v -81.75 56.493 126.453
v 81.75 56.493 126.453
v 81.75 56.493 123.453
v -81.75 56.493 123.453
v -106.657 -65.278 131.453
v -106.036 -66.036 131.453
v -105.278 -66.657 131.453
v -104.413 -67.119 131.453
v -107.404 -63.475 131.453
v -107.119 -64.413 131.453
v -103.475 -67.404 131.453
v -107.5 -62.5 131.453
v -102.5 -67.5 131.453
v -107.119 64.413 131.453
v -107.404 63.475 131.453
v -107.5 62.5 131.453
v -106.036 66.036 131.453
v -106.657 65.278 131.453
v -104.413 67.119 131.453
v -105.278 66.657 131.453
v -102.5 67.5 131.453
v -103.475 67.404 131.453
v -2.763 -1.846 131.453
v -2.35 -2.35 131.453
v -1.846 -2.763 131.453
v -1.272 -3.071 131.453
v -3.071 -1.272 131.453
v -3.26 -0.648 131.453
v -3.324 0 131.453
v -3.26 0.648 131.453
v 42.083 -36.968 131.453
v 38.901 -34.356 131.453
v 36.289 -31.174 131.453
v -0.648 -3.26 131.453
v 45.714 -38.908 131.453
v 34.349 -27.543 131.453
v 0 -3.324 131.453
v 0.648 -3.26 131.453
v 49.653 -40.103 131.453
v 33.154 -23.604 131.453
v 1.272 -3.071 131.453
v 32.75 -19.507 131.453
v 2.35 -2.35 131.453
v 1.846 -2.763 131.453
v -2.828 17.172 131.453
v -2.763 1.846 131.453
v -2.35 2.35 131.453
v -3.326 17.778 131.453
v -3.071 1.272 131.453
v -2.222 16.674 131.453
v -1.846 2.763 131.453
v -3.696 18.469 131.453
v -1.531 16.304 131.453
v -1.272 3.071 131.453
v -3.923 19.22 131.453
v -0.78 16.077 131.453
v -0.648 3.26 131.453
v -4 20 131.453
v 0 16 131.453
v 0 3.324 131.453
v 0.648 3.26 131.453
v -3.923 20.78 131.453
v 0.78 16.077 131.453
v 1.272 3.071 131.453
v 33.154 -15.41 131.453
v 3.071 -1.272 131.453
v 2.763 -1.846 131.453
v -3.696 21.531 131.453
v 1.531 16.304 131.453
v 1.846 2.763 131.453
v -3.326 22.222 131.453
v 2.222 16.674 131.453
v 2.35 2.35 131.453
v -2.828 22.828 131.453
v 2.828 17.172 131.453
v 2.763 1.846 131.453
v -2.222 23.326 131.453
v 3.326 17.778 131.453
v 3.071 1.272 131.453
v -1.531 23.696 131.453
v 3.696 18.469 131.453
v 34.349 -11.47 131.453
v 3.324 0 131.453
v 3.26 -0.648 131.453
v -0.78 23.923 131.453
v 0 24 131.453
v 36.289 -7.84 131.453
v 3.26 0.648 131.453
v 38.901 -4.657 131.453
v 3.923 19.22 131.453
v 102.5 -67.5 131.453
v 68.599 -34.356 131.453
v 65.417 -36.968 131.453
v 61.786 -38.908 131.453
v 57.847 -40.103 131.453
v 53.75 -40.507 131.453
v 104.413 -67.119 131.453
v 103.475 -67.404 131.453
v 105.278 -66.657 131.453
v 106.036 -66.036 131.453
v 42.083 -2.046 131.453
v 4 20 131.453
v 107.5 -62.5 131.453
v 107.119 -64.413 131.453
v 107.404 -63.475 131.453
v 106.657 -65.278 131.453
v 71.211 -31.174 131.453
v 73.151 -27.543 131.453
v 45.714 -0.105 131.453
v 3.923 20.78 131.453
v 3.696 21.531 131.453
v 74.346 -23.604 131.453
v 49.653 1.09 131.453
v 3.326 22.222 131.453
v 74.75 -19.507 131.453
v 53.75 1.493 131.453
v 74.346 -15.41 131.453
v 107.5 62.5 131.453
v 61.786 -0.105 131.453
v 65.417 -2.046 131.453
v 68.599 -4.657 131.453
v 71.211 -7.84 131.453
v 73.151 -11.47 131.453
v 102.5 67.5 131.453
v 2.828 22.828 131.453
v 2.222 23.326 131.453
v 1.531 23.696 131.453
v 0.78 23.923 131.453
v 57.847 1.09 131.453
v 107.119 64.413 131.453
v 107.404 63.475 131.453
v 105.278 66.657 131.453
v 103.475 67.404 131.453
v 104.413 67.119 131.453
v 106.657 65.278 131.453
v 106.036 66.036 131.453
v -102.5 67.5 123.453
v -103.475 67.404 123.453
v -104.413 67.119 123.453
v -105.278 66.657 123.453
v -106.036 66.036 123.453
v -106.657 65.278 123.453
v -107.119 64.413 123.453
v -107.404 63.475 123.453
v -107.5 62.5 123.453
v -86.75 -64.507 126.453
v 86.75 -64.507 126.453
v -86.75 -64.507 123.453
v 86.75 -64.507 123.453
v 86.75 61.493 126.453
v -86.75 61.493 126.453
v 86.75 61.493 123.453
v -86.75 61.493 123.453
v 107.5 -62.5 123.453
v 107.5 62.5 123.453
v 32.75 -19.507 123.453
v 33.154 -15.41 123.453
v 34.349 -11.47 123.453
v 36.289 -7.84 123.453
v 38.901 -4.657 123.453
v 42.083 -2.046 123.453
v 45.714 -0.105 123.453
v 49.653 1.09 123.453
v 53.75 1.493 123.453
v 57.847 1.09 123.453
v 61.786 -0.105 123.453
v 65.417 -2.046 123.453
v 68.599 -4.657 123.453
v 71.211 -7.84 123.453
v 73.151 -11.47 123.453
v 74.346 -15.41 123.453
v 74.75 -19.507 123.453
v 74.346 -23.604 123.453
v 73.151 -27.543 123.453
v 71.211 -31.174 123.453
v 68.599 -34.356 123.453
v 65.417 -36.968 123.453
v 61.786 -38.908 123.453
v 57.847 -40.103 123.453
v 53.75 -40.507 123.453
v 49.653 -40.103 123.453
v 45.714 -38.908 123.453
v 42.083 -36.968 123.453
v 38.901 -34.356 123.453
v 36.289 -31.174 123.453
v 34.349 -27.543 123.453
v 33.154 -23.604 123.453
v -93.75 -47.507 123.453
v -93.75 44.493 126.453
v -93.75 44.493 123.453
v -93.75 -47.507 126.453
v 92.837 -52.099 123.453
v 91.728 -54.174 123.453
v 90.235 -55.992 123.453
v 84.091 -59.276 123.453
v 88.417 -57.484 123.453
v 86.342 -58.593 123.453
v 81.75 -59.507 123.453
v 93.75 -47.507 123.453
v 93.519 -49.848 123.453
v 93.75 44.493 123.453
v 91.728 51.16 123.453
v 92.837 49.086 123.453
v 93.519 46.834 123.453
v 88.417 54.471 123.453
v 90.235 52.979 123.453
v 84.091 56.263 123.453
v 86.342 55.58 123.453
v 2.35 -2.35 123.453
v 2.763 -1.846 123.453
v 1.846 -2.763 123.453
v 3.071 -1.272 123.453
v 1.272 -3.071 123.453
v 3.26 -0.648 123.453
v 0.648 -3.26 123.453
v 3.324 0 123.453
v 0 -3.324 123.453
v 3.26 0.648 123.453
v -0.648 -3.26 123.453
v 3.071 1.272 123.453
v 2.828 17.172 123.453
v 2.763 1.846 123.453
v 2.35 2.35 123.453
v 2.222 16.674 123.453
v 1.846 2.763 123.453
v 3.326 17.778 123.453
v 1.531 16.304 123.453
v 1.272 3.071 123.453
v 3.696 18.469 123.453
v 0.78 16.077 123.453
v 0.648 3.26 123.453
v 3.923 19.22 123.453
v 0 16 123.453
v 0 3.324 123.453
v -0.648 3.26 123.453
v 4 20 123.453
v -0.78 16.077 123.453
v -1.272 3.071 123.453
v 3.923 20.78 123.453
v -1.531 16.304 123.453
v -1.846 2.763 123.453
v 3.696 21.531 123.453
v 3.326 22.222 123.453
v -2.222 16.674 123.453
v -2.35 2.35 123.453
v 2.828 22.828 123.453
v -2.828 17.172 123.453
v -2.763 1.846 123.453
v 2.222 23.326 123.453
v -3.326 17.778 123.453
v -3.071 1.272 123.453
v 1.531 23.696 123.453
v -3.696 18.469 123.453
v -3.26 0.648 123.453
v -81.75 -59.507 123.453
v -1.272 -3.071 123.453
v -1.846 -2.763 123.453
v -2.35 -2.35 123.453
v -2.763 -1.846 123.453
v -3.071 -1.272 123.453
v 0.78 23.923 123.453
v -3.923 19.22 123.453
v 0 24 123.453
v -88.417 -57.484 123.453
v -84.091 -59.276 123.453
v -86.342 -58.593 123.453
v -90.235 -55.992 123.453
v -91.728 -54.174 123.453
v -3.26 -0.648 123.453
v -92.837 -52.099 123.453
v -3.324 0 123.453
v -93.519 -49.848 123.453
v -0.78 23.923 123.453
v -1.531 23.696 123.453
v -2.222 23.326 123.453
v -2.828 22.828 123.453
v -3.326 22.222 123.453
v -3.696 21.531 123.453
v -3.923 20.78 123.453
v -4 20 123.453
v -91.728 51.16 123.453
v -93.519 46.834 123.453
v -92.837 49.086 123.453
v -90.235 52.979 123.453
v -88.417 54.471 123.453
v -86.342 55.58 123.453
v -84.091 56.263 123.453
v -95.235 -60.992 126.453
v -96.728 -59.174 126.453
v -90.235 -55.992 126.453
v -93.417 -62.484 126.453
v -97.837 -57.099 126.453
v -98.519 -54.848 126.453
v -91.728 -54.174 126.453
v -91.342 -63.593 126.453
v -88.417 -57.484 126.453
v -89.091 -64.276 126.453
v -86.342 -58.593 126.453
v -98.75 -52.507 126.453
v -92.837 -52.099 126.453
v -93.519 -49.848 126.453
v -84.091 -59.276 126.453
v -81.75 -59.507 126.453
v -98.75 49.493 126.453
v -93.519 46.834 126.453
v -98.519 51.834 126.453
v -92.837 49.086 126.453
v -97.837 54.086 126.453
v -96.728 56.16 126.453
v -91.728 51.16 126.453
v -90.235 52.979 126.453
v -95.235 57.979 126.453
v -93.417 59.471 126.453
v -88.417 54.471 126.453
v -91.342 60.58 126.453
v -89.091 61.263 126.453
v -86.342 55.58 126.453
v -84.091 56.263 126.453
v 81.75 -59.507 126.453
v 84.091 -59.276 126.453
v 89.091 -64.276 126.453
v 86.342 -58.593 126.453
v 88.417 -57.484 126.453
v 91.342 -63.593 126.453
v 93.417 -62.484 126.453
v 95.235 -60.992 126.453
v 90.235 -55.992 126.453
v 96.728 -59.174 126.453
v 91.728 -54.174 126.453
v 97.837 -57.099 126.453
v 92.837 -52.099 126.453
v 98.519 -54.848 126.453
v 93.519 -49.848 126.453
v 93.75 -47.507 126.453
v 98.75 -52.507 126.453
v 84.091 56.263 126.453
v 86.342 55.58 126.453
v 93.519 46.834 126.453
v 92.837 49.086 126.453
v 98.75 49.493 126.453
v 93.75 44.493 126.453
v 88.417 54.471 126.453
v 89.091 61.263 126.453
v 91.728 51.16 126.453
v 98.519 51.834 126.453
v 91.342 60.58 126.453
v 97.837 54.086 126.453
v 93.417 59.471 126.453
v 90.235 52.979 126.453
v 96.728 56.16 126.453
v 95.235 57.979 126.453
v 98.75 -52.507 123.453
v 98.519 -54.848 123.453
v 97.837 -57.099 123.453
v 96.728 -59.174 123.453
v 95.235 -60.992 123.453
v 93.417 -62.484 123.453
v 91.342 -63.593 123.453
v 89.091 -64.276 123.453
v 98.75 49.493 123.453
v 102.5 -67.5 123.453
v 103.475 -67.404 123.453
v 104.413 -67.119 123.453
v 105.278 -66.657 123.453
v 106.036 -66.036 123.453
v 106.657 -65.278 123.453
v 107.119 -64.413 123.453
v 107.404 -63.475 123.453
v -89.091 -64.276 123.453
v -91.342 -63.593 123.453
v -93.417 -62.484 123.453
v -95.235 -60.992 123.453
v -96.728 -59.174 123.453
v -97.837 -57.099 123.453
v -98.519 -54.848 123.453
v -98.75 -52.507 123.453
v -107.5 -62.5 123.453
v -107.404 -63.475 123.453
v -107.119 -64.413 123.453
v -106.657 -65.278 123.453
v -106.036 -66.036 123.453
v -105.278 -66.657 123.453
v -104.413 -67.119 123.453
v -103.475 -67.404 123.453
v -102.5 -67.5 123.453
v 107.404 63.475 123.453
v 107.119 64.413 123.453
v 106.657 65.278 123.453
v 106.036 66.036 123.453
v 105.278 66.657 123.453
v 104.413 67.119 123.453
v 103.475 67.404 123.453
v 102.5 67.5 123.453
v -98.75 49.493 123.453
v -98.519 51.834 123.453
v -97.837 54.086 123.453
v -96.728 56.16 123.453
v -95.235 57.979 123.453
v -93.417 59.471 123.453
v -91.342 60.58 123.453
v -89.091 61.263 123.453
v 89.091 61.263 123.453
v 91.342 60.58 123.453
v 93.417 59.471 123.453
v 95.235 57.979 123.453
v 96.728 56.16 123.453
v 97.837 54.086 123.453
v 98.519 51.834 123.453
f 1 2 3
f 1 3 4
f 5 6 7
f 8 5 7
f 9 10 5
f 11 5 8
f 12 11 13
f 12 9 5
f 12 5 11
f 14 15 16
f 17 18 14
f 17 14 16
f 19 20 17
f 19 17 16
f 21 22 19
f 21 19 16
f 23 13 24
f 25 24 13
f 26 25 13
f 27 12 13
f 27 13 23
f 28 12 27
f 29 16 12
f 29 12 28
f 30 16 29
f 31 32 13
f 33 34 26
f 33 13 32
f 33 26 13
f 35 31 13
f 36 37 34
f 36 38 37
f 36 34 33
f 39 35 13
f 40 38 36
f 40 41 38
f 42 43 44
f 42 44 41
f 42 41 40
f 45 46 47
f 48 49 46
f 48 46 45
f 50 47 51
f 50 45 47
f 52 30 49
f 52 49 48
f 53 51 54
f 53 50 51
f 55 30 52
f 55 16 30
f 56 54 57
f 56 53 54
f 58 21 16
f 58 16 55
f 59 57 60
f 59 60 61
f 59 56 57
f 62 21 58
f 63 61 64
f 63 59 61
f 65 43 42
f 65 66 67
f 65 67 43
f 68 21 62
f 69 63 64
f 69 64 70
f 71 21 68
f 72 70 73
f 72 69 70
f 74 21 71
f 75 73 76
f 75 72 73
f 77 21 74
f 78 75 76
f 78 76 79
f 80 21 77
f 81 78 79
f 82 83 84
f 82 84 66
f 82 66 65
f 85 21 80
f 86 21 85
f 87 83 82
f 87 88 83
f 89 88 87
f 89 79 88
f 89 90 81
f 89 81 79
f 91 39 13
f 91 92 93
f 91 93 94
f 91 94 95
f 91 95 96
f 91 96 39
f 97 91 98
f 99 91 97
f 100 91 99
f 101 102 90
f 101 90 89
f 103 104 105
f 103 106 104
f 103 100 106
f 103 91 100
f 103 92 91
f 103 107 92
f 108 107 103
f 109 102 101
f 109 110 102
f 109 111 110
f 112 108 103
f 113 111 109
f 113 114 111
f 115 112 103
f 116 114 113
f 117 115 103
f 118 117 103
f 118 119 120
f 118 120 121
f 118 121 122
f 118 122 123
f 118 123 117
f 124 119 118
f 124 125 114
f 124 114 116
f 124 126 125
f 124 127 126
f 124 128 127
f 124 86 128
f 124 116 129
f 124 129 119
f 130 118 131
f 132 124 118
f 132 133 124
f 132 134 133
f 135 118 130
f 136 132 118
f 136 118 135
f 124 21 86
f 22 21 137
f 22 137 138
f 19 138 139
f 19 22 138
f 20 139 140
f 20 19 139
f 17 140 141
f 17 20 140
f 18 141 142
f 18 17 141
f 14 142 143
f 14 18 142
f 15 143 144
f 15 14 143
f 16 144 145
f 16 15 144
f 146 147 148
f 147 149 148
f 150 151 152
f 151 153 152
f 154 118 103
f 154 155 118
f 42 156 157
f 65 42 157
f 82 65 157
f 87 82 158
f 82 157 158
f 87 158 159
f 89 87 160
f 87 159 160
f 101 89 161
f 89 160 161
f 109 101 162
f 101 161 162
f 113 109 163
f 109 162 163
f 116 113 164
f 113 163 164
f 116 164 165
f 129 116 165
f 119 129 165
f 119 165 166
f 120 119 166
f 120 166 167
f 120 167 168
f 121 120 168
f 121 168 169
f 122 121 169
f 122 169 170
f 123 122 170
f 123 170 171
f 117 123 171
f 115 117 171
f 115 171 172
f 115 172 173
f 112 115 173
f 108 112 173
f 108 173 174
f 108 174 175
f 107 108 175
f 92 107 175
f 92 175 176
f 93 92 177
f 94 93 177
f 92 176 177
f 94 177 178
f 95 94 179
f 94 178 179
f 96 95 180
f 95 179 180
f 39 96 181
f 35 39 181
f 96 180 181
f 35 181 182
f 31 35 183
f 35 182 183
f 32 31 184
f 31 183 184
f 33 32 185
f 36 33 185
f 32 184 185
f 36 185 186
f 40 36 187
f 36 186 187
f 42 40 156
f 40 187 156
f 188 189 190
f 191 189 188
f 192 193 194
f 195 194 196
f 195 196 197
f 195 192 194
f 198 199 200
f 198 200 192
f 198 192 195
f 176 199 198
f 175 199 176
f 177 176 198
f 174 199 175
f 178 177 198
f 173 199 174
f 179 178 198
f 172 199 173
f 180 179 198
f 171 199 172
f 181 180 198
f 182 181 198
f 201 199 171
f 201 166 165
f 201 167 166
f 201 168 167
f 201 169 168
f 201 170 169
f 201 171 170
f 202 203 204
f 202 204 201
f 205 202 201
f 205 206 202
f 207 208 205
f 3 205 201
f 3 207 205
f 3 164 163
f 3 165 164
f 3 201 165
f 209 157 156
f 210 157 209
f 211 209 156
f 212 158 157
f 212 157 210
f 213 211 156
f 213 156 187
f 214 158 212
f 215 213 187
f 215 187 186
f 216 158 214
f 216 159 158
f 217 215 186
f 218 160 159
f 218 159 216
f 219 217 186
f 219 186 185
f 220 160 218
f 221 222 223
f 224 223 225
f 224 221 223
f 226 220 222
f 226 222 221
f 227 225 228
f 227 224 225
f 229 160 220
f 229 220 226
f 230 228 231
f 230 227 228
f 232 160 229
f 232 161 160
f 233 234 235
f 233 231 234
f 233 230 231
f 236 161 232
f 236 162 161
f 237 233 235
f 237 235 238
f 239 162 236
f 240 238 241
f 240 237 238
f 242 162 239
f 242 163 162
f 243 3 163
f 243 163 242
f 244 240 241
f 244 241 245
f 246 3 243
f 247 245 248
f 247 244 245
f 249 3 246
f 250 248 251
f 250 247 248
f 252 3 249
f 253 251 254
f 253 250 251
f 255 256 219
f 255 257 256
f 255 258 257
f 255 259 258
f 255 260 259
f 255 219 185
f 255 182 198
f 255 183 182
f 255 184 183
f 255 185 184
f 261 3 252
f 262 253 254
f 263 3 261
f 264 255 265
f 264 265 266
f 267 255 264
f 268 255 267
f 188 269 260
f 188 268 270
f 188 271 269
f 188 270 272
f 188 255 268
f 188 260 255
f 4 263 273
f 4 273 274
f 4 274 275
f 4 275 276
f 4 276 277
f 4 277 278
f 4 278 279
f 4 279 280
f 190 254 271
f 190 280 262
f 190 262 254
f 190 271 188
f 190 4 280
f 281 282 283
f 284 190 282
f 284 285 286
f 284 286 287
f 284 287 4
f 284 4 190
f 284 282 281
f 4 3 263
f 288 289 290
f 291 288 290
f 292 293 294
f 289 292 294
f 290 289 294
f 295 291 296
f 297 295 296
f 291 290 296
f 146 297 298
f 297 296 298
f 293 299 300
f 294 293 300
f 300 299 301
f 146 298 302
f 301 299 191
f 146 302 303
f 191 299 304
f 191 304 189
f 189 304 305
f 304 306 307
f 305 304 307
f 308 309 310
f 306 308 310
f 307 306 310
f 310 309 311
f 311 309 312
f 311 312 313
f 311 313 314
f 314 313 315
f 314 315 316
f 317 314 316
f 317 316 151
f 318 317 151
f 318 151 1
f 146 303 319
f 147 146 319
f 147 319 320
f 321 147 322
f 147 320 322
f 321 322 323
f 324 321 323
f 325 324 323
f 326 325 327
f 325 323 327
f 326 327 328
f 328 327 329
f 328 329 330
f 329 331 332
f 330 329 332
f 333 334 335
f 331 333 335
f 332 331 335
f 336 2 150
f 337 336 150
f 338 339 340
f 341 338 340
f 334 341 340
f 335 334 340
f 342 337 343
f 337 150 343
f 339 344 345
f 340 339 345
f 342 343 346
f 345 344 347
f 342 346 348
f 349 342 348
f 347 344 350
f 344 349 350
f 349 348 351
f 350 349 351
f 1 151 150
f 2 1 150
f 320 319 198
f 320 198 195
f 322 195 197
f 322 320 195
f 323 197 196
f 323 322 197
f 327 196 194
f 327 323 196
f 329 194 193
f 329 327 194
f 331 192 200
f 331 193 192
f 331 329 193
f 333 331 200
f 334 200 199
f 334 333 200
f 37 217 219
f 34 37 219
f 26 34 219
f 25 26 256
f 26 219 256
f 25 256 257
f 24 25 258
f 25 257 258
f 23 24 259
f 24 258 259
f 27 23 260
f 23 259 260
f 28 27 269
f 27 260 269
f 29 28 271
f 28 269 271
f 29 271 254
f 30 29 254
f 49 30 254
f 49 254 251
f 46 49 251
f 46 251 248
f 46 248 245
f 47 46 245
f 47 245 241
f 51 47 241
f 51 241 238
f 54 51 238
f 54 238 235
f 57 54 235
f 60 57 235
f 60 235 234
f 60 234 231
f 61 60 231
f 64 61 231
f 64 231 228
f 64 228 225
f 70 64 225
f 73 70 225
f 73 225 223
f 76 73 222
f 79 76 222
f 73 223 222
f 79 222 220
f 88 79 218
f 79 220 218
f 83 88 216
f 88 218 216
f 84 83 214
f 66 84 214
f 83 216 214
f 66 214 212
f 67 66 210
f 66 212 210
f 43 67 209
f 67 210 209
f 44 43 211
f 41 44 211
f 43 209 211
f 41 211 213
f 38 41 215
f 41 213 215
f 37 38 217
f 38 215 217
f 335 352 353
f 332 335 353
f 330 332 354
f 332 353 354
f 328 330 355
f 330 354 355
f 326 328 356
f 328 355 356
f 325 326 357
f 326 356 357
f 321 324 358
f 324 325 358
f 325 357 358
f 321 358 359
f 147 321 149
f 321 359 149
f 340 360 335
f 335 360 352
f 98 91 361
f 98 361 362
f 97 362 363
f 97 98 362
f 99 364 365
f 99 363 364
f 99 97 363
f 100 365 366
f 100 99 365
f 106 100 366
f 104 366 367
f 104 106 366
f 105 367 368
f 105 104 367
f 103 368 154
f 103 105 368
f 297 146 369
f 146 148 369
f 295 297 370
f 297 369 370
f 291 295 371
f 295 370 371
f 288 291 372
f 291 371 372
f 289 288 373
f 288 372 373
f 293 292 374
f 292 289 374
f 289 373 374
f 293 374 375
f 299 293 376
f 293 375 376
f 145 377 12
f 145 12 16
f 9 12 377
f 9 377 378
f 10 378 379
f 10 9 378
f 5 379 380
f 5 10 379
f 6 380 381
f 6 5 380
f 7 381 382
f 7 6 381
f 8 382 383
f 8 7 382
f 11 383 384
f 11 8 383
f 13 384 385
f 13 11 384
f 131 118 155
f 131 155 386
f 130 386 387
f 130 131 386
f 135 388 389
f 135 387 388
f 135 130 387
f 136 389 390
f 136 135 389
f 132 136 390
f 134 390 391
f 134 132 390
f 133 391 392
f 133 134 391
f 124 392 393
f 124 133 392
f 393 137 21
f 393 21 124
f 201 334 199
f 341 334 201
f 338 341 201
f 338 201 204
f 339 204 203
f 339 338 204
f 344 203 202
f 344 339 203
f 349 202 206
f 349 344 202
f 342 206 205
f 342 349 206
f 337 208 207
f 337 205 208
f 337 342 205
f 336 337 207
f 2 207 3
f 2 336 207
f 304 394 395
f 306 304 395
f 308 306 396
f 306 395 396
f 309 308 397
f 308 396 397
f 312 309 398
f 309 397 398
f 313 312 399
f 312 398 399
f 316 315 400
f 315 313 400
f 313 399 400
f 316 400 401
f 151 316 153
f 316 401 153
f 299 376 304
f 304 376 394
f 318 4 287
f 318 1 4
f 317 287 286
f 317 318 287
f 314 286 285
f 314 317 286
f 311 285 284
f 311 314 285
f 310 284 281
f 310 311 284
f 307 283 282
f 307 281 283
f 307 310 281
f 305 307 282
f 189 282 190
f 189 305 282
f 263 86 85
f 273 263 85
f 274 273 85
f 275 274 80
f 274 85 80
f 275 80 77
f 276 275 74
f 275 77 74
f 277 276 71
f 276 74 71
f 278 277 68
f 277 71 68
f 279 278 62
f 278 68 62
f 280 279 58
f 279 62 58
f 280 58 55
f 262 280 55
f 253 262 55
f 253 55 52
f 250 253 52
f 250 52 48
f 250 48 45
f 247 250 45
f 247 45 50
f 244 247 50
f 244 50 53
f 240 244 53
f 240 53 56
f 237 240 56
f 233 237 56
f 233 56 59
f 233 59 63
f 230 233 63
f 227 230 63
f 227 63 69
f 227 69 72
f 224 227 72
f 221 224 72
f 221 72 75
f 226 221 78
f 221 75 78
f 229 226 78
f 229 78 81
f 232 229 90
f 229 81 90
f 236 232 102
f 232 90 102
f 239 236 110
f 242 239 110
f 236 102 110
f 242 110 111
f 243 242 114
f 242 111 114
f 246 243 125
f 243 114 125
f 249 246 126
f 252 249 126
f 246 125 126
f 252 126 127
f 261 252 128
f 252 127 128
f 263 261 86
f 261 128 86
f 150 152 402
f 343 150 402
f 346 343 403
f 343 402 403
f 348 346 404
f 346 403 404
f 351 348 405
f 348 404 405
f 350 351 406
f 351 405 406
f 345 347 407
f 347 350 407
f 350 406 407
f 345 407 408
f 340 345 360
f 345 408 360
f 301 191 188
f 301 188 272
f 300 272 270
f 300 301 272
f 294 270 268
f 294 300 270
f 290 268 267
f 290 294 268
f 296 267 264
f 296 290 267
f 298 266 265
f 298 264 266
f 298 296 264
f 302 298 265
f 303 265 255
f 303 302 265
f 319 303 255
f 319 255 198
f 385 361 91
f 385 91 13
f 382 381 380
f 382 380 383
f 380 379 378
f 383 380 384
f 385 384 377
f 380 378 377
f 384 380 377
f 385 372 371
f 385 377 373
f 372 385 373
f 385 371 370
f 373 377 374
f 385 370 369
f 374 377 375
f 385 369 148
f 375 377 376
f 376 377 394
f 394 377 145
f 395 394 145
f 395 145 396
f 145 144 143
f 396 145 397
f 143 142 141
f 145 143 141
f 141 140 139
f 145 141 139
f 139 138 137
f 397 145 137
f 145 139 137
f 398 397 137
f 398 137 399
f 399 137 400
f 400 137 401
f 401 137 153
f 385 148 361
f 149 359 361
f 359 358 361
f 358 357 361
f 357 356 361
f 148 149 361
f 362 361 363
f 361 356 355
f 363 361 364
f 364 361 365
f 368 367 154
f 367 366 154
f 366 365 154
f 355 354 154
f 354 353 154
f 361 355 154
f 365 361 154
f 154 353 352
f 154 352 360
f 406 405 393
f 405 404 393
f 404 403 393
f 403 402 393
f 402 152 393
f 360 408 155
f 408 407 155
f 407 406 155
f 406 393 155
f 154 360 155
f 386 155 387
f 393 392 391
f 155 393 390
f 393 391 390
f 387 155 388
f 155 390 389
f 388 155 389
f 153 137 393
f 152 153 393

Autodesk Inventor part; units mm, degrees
ref_plane "YZ Plane" through (0, 0, 0) normal (1, 0, 0) x (0, 1, 0)
ref_plane "XZ Plane" through (0, 0, 0) normal (0, 1, 0) x (-1, 0, 0)
ref_plane "XY Plane" through (0, 0, 0) normal (0, 0, 1) x (1, 0, 0)
ref_plane "Work Plane1" through (0, -1.5067, 123.4533) normal (0, 0, 1) x (1, 0, 0)
sketch "Sketch1" plane through (0, -1.5067, 123.4533) normal (0, 0, 1) x (1, 0, 0)
  arc A0 (-98.75, -51) -> (-86.75, -63) centre (-86.75, -51) ccw projected
  line L0 (86.75, -63) -> (-86.75, -63) projected
  arc A1 (86.75, -63) -> (98.75, -51) centre (86.75, -51) ccw projected
  line L1 (98.75, 51) -> (98.75, -51) projected
  arc A2 (98.75, 51) -> (86.75, 63) centre (86.75, 51) ccw projected
  line L2 (-86.75, 63) -> (86.75, 63) projected
  arc A3 (-86.75, 63) -> (-98.75, 51) centre (-86.75, 51) ccw projected
  line L3 (-98.75, -51) -> (-98.75, 51) projected
  line L4 (93.75, 46) -> (93.75, -46) projected
  arc A4 (81.75, -58) -> (93.75, -46) centre (81.75, -46) ccw projected
  line L5 (81.75, -58) -> (-81.75, -58) projected
  arc A5 (-93.75, -46) -> (-81.75, -58) centre (-81.75, -46) ccw projected
  line L6 (-93.75, -46) -> (-93.75, 46) projected
  arc A6 (-81.75, 58) -> (-93.75, 46) centre (-81.75, 46) ccw projected
  line L7 (-81.75, 58) -> (81.75, 58) projected
  arc A7 (93.75, 46) -> (81.75, 58) centre (81.75, 46) ccw projected
  point P0 (0, 1.5067)
sketch "Sketch2" plane through (0, -1.5067, 123.4533) normal (0, 0, 1) x (1, 0, 0)
  line L0 (-107.5, 69.0067) -> (107.5, 69.0067)
  line L1 (107.5, 69.0067) -> (107.5, -65.9933)
  line L2 (107.5, -65.9933) -> (-107.5, -65.9933)
  line L3 (-107.5, -65.9933) -> (-107.5, 69.0067)
  point P0 (0, 1.5067)
  dimension "height" = 135
  dimension "width" = 215
  dimension "d2" = 107.5
  dimension "d3" = 67.5
extrude "Extrusion1" add sketch "Sketch2" along normal blind 8
fillet "Fillet1" radius 5 4 edges at (-107.5, 67.5, 127.4533) (107.5, 67.5, 127.4533) (107.5, -67.5, 127.4533) (-107.5, -67.5, 127.4533)
extrude "Extrusion2" cut sketch "Sketch1" along normal blind 3 contours L3 A3 L2 A2 L1 A1 L0 A0 | L4 A4 L5 A5 L6 A6 L7 A7
sketch "Sketch3" plane through (0, -1.5067, 126.4533) normal (0, 0, -1) x (-1, 0, 0)
  line L0 (93.75, 46) -> (93.75, -46)
  arc A0 (81.75, -58) -> (93.75, -46) centre (81.75, -46) ccw
  line L1 (81.75, -58) -> (-81.75, -58)
  arc A1 (-93.75, -46) -> (-81.75, -58) centre (-81.75, -46) ccw
  line L2 (-93.75, -46) -> (-93.75, 46)
  arc A2 (-81.75, 58) -> (-93.75, 46) centre (-81.75, 46) ccw
  line L3 (-81.75, 58) -> (81.75, 58)
  arc A3 (93.75, 46) -> (81.75, 58) centre (81.75, 46) ccw
  point P0 (0, 1.5067)
  point P1 (86.75, -51)
extrude "Extrusion3" add sketch "Sketch3" along normal blind 3
hole "Hole1" at (0, 0, 131.4533) direction (0, 0, -1) diameter 6.647 end through all thread size "M8x1.25" class "6H" standard "ANSI Metric M Profile"
sketch "Sketch4" plane through (0, -1.5067, 123.4533) normal (0, 0, -1) x (-1, 0, 0)
  circle A0 centre (-53.75, -18) radius 37
  line L0 (-15, 6.5067) -> (15, 6.5067)
  line L1 (15, 6.5067) -> (15, 36.5067)
  line L2 (15, 36.5067) -> (-15, 36.5067)
  line L3 (-15, 36.5067) -> (-15, 6.5067)
  line L4 (-93.75, 46) -> (-93.75, -46) projected
  line L5 (-81.75, -58) -> (81.75, -58) projected
  circle A1 centre (-53.75, -18) radius 21
  point P0 (0, 1.5067)
  dimension "d20" = 74
  dimension "d21" = 30
  dimension "d22" = 30
  dimension "d23" = 15
  dimension "d24" = 40
  dimension "d25" = 40
  dimension "d26" = 5
  dimension "d27" = 42
extrude "Extrusion4" cut sketch "Sketch4" against normal through all contours A1
hole "Hole2" at (0, 20, 123.4533) direction (0, 0, 1) diameter 8 end through all
equation "\"d2\" = 0.5 * width"
equation "\"d3\" = 0.5 * height"
equation "\"d9\" = 0.5 * height"
equation "\"d10\" = 0.5 * width"
equation "\"d30\" = 0.5 * width"
properties part number "capac"
